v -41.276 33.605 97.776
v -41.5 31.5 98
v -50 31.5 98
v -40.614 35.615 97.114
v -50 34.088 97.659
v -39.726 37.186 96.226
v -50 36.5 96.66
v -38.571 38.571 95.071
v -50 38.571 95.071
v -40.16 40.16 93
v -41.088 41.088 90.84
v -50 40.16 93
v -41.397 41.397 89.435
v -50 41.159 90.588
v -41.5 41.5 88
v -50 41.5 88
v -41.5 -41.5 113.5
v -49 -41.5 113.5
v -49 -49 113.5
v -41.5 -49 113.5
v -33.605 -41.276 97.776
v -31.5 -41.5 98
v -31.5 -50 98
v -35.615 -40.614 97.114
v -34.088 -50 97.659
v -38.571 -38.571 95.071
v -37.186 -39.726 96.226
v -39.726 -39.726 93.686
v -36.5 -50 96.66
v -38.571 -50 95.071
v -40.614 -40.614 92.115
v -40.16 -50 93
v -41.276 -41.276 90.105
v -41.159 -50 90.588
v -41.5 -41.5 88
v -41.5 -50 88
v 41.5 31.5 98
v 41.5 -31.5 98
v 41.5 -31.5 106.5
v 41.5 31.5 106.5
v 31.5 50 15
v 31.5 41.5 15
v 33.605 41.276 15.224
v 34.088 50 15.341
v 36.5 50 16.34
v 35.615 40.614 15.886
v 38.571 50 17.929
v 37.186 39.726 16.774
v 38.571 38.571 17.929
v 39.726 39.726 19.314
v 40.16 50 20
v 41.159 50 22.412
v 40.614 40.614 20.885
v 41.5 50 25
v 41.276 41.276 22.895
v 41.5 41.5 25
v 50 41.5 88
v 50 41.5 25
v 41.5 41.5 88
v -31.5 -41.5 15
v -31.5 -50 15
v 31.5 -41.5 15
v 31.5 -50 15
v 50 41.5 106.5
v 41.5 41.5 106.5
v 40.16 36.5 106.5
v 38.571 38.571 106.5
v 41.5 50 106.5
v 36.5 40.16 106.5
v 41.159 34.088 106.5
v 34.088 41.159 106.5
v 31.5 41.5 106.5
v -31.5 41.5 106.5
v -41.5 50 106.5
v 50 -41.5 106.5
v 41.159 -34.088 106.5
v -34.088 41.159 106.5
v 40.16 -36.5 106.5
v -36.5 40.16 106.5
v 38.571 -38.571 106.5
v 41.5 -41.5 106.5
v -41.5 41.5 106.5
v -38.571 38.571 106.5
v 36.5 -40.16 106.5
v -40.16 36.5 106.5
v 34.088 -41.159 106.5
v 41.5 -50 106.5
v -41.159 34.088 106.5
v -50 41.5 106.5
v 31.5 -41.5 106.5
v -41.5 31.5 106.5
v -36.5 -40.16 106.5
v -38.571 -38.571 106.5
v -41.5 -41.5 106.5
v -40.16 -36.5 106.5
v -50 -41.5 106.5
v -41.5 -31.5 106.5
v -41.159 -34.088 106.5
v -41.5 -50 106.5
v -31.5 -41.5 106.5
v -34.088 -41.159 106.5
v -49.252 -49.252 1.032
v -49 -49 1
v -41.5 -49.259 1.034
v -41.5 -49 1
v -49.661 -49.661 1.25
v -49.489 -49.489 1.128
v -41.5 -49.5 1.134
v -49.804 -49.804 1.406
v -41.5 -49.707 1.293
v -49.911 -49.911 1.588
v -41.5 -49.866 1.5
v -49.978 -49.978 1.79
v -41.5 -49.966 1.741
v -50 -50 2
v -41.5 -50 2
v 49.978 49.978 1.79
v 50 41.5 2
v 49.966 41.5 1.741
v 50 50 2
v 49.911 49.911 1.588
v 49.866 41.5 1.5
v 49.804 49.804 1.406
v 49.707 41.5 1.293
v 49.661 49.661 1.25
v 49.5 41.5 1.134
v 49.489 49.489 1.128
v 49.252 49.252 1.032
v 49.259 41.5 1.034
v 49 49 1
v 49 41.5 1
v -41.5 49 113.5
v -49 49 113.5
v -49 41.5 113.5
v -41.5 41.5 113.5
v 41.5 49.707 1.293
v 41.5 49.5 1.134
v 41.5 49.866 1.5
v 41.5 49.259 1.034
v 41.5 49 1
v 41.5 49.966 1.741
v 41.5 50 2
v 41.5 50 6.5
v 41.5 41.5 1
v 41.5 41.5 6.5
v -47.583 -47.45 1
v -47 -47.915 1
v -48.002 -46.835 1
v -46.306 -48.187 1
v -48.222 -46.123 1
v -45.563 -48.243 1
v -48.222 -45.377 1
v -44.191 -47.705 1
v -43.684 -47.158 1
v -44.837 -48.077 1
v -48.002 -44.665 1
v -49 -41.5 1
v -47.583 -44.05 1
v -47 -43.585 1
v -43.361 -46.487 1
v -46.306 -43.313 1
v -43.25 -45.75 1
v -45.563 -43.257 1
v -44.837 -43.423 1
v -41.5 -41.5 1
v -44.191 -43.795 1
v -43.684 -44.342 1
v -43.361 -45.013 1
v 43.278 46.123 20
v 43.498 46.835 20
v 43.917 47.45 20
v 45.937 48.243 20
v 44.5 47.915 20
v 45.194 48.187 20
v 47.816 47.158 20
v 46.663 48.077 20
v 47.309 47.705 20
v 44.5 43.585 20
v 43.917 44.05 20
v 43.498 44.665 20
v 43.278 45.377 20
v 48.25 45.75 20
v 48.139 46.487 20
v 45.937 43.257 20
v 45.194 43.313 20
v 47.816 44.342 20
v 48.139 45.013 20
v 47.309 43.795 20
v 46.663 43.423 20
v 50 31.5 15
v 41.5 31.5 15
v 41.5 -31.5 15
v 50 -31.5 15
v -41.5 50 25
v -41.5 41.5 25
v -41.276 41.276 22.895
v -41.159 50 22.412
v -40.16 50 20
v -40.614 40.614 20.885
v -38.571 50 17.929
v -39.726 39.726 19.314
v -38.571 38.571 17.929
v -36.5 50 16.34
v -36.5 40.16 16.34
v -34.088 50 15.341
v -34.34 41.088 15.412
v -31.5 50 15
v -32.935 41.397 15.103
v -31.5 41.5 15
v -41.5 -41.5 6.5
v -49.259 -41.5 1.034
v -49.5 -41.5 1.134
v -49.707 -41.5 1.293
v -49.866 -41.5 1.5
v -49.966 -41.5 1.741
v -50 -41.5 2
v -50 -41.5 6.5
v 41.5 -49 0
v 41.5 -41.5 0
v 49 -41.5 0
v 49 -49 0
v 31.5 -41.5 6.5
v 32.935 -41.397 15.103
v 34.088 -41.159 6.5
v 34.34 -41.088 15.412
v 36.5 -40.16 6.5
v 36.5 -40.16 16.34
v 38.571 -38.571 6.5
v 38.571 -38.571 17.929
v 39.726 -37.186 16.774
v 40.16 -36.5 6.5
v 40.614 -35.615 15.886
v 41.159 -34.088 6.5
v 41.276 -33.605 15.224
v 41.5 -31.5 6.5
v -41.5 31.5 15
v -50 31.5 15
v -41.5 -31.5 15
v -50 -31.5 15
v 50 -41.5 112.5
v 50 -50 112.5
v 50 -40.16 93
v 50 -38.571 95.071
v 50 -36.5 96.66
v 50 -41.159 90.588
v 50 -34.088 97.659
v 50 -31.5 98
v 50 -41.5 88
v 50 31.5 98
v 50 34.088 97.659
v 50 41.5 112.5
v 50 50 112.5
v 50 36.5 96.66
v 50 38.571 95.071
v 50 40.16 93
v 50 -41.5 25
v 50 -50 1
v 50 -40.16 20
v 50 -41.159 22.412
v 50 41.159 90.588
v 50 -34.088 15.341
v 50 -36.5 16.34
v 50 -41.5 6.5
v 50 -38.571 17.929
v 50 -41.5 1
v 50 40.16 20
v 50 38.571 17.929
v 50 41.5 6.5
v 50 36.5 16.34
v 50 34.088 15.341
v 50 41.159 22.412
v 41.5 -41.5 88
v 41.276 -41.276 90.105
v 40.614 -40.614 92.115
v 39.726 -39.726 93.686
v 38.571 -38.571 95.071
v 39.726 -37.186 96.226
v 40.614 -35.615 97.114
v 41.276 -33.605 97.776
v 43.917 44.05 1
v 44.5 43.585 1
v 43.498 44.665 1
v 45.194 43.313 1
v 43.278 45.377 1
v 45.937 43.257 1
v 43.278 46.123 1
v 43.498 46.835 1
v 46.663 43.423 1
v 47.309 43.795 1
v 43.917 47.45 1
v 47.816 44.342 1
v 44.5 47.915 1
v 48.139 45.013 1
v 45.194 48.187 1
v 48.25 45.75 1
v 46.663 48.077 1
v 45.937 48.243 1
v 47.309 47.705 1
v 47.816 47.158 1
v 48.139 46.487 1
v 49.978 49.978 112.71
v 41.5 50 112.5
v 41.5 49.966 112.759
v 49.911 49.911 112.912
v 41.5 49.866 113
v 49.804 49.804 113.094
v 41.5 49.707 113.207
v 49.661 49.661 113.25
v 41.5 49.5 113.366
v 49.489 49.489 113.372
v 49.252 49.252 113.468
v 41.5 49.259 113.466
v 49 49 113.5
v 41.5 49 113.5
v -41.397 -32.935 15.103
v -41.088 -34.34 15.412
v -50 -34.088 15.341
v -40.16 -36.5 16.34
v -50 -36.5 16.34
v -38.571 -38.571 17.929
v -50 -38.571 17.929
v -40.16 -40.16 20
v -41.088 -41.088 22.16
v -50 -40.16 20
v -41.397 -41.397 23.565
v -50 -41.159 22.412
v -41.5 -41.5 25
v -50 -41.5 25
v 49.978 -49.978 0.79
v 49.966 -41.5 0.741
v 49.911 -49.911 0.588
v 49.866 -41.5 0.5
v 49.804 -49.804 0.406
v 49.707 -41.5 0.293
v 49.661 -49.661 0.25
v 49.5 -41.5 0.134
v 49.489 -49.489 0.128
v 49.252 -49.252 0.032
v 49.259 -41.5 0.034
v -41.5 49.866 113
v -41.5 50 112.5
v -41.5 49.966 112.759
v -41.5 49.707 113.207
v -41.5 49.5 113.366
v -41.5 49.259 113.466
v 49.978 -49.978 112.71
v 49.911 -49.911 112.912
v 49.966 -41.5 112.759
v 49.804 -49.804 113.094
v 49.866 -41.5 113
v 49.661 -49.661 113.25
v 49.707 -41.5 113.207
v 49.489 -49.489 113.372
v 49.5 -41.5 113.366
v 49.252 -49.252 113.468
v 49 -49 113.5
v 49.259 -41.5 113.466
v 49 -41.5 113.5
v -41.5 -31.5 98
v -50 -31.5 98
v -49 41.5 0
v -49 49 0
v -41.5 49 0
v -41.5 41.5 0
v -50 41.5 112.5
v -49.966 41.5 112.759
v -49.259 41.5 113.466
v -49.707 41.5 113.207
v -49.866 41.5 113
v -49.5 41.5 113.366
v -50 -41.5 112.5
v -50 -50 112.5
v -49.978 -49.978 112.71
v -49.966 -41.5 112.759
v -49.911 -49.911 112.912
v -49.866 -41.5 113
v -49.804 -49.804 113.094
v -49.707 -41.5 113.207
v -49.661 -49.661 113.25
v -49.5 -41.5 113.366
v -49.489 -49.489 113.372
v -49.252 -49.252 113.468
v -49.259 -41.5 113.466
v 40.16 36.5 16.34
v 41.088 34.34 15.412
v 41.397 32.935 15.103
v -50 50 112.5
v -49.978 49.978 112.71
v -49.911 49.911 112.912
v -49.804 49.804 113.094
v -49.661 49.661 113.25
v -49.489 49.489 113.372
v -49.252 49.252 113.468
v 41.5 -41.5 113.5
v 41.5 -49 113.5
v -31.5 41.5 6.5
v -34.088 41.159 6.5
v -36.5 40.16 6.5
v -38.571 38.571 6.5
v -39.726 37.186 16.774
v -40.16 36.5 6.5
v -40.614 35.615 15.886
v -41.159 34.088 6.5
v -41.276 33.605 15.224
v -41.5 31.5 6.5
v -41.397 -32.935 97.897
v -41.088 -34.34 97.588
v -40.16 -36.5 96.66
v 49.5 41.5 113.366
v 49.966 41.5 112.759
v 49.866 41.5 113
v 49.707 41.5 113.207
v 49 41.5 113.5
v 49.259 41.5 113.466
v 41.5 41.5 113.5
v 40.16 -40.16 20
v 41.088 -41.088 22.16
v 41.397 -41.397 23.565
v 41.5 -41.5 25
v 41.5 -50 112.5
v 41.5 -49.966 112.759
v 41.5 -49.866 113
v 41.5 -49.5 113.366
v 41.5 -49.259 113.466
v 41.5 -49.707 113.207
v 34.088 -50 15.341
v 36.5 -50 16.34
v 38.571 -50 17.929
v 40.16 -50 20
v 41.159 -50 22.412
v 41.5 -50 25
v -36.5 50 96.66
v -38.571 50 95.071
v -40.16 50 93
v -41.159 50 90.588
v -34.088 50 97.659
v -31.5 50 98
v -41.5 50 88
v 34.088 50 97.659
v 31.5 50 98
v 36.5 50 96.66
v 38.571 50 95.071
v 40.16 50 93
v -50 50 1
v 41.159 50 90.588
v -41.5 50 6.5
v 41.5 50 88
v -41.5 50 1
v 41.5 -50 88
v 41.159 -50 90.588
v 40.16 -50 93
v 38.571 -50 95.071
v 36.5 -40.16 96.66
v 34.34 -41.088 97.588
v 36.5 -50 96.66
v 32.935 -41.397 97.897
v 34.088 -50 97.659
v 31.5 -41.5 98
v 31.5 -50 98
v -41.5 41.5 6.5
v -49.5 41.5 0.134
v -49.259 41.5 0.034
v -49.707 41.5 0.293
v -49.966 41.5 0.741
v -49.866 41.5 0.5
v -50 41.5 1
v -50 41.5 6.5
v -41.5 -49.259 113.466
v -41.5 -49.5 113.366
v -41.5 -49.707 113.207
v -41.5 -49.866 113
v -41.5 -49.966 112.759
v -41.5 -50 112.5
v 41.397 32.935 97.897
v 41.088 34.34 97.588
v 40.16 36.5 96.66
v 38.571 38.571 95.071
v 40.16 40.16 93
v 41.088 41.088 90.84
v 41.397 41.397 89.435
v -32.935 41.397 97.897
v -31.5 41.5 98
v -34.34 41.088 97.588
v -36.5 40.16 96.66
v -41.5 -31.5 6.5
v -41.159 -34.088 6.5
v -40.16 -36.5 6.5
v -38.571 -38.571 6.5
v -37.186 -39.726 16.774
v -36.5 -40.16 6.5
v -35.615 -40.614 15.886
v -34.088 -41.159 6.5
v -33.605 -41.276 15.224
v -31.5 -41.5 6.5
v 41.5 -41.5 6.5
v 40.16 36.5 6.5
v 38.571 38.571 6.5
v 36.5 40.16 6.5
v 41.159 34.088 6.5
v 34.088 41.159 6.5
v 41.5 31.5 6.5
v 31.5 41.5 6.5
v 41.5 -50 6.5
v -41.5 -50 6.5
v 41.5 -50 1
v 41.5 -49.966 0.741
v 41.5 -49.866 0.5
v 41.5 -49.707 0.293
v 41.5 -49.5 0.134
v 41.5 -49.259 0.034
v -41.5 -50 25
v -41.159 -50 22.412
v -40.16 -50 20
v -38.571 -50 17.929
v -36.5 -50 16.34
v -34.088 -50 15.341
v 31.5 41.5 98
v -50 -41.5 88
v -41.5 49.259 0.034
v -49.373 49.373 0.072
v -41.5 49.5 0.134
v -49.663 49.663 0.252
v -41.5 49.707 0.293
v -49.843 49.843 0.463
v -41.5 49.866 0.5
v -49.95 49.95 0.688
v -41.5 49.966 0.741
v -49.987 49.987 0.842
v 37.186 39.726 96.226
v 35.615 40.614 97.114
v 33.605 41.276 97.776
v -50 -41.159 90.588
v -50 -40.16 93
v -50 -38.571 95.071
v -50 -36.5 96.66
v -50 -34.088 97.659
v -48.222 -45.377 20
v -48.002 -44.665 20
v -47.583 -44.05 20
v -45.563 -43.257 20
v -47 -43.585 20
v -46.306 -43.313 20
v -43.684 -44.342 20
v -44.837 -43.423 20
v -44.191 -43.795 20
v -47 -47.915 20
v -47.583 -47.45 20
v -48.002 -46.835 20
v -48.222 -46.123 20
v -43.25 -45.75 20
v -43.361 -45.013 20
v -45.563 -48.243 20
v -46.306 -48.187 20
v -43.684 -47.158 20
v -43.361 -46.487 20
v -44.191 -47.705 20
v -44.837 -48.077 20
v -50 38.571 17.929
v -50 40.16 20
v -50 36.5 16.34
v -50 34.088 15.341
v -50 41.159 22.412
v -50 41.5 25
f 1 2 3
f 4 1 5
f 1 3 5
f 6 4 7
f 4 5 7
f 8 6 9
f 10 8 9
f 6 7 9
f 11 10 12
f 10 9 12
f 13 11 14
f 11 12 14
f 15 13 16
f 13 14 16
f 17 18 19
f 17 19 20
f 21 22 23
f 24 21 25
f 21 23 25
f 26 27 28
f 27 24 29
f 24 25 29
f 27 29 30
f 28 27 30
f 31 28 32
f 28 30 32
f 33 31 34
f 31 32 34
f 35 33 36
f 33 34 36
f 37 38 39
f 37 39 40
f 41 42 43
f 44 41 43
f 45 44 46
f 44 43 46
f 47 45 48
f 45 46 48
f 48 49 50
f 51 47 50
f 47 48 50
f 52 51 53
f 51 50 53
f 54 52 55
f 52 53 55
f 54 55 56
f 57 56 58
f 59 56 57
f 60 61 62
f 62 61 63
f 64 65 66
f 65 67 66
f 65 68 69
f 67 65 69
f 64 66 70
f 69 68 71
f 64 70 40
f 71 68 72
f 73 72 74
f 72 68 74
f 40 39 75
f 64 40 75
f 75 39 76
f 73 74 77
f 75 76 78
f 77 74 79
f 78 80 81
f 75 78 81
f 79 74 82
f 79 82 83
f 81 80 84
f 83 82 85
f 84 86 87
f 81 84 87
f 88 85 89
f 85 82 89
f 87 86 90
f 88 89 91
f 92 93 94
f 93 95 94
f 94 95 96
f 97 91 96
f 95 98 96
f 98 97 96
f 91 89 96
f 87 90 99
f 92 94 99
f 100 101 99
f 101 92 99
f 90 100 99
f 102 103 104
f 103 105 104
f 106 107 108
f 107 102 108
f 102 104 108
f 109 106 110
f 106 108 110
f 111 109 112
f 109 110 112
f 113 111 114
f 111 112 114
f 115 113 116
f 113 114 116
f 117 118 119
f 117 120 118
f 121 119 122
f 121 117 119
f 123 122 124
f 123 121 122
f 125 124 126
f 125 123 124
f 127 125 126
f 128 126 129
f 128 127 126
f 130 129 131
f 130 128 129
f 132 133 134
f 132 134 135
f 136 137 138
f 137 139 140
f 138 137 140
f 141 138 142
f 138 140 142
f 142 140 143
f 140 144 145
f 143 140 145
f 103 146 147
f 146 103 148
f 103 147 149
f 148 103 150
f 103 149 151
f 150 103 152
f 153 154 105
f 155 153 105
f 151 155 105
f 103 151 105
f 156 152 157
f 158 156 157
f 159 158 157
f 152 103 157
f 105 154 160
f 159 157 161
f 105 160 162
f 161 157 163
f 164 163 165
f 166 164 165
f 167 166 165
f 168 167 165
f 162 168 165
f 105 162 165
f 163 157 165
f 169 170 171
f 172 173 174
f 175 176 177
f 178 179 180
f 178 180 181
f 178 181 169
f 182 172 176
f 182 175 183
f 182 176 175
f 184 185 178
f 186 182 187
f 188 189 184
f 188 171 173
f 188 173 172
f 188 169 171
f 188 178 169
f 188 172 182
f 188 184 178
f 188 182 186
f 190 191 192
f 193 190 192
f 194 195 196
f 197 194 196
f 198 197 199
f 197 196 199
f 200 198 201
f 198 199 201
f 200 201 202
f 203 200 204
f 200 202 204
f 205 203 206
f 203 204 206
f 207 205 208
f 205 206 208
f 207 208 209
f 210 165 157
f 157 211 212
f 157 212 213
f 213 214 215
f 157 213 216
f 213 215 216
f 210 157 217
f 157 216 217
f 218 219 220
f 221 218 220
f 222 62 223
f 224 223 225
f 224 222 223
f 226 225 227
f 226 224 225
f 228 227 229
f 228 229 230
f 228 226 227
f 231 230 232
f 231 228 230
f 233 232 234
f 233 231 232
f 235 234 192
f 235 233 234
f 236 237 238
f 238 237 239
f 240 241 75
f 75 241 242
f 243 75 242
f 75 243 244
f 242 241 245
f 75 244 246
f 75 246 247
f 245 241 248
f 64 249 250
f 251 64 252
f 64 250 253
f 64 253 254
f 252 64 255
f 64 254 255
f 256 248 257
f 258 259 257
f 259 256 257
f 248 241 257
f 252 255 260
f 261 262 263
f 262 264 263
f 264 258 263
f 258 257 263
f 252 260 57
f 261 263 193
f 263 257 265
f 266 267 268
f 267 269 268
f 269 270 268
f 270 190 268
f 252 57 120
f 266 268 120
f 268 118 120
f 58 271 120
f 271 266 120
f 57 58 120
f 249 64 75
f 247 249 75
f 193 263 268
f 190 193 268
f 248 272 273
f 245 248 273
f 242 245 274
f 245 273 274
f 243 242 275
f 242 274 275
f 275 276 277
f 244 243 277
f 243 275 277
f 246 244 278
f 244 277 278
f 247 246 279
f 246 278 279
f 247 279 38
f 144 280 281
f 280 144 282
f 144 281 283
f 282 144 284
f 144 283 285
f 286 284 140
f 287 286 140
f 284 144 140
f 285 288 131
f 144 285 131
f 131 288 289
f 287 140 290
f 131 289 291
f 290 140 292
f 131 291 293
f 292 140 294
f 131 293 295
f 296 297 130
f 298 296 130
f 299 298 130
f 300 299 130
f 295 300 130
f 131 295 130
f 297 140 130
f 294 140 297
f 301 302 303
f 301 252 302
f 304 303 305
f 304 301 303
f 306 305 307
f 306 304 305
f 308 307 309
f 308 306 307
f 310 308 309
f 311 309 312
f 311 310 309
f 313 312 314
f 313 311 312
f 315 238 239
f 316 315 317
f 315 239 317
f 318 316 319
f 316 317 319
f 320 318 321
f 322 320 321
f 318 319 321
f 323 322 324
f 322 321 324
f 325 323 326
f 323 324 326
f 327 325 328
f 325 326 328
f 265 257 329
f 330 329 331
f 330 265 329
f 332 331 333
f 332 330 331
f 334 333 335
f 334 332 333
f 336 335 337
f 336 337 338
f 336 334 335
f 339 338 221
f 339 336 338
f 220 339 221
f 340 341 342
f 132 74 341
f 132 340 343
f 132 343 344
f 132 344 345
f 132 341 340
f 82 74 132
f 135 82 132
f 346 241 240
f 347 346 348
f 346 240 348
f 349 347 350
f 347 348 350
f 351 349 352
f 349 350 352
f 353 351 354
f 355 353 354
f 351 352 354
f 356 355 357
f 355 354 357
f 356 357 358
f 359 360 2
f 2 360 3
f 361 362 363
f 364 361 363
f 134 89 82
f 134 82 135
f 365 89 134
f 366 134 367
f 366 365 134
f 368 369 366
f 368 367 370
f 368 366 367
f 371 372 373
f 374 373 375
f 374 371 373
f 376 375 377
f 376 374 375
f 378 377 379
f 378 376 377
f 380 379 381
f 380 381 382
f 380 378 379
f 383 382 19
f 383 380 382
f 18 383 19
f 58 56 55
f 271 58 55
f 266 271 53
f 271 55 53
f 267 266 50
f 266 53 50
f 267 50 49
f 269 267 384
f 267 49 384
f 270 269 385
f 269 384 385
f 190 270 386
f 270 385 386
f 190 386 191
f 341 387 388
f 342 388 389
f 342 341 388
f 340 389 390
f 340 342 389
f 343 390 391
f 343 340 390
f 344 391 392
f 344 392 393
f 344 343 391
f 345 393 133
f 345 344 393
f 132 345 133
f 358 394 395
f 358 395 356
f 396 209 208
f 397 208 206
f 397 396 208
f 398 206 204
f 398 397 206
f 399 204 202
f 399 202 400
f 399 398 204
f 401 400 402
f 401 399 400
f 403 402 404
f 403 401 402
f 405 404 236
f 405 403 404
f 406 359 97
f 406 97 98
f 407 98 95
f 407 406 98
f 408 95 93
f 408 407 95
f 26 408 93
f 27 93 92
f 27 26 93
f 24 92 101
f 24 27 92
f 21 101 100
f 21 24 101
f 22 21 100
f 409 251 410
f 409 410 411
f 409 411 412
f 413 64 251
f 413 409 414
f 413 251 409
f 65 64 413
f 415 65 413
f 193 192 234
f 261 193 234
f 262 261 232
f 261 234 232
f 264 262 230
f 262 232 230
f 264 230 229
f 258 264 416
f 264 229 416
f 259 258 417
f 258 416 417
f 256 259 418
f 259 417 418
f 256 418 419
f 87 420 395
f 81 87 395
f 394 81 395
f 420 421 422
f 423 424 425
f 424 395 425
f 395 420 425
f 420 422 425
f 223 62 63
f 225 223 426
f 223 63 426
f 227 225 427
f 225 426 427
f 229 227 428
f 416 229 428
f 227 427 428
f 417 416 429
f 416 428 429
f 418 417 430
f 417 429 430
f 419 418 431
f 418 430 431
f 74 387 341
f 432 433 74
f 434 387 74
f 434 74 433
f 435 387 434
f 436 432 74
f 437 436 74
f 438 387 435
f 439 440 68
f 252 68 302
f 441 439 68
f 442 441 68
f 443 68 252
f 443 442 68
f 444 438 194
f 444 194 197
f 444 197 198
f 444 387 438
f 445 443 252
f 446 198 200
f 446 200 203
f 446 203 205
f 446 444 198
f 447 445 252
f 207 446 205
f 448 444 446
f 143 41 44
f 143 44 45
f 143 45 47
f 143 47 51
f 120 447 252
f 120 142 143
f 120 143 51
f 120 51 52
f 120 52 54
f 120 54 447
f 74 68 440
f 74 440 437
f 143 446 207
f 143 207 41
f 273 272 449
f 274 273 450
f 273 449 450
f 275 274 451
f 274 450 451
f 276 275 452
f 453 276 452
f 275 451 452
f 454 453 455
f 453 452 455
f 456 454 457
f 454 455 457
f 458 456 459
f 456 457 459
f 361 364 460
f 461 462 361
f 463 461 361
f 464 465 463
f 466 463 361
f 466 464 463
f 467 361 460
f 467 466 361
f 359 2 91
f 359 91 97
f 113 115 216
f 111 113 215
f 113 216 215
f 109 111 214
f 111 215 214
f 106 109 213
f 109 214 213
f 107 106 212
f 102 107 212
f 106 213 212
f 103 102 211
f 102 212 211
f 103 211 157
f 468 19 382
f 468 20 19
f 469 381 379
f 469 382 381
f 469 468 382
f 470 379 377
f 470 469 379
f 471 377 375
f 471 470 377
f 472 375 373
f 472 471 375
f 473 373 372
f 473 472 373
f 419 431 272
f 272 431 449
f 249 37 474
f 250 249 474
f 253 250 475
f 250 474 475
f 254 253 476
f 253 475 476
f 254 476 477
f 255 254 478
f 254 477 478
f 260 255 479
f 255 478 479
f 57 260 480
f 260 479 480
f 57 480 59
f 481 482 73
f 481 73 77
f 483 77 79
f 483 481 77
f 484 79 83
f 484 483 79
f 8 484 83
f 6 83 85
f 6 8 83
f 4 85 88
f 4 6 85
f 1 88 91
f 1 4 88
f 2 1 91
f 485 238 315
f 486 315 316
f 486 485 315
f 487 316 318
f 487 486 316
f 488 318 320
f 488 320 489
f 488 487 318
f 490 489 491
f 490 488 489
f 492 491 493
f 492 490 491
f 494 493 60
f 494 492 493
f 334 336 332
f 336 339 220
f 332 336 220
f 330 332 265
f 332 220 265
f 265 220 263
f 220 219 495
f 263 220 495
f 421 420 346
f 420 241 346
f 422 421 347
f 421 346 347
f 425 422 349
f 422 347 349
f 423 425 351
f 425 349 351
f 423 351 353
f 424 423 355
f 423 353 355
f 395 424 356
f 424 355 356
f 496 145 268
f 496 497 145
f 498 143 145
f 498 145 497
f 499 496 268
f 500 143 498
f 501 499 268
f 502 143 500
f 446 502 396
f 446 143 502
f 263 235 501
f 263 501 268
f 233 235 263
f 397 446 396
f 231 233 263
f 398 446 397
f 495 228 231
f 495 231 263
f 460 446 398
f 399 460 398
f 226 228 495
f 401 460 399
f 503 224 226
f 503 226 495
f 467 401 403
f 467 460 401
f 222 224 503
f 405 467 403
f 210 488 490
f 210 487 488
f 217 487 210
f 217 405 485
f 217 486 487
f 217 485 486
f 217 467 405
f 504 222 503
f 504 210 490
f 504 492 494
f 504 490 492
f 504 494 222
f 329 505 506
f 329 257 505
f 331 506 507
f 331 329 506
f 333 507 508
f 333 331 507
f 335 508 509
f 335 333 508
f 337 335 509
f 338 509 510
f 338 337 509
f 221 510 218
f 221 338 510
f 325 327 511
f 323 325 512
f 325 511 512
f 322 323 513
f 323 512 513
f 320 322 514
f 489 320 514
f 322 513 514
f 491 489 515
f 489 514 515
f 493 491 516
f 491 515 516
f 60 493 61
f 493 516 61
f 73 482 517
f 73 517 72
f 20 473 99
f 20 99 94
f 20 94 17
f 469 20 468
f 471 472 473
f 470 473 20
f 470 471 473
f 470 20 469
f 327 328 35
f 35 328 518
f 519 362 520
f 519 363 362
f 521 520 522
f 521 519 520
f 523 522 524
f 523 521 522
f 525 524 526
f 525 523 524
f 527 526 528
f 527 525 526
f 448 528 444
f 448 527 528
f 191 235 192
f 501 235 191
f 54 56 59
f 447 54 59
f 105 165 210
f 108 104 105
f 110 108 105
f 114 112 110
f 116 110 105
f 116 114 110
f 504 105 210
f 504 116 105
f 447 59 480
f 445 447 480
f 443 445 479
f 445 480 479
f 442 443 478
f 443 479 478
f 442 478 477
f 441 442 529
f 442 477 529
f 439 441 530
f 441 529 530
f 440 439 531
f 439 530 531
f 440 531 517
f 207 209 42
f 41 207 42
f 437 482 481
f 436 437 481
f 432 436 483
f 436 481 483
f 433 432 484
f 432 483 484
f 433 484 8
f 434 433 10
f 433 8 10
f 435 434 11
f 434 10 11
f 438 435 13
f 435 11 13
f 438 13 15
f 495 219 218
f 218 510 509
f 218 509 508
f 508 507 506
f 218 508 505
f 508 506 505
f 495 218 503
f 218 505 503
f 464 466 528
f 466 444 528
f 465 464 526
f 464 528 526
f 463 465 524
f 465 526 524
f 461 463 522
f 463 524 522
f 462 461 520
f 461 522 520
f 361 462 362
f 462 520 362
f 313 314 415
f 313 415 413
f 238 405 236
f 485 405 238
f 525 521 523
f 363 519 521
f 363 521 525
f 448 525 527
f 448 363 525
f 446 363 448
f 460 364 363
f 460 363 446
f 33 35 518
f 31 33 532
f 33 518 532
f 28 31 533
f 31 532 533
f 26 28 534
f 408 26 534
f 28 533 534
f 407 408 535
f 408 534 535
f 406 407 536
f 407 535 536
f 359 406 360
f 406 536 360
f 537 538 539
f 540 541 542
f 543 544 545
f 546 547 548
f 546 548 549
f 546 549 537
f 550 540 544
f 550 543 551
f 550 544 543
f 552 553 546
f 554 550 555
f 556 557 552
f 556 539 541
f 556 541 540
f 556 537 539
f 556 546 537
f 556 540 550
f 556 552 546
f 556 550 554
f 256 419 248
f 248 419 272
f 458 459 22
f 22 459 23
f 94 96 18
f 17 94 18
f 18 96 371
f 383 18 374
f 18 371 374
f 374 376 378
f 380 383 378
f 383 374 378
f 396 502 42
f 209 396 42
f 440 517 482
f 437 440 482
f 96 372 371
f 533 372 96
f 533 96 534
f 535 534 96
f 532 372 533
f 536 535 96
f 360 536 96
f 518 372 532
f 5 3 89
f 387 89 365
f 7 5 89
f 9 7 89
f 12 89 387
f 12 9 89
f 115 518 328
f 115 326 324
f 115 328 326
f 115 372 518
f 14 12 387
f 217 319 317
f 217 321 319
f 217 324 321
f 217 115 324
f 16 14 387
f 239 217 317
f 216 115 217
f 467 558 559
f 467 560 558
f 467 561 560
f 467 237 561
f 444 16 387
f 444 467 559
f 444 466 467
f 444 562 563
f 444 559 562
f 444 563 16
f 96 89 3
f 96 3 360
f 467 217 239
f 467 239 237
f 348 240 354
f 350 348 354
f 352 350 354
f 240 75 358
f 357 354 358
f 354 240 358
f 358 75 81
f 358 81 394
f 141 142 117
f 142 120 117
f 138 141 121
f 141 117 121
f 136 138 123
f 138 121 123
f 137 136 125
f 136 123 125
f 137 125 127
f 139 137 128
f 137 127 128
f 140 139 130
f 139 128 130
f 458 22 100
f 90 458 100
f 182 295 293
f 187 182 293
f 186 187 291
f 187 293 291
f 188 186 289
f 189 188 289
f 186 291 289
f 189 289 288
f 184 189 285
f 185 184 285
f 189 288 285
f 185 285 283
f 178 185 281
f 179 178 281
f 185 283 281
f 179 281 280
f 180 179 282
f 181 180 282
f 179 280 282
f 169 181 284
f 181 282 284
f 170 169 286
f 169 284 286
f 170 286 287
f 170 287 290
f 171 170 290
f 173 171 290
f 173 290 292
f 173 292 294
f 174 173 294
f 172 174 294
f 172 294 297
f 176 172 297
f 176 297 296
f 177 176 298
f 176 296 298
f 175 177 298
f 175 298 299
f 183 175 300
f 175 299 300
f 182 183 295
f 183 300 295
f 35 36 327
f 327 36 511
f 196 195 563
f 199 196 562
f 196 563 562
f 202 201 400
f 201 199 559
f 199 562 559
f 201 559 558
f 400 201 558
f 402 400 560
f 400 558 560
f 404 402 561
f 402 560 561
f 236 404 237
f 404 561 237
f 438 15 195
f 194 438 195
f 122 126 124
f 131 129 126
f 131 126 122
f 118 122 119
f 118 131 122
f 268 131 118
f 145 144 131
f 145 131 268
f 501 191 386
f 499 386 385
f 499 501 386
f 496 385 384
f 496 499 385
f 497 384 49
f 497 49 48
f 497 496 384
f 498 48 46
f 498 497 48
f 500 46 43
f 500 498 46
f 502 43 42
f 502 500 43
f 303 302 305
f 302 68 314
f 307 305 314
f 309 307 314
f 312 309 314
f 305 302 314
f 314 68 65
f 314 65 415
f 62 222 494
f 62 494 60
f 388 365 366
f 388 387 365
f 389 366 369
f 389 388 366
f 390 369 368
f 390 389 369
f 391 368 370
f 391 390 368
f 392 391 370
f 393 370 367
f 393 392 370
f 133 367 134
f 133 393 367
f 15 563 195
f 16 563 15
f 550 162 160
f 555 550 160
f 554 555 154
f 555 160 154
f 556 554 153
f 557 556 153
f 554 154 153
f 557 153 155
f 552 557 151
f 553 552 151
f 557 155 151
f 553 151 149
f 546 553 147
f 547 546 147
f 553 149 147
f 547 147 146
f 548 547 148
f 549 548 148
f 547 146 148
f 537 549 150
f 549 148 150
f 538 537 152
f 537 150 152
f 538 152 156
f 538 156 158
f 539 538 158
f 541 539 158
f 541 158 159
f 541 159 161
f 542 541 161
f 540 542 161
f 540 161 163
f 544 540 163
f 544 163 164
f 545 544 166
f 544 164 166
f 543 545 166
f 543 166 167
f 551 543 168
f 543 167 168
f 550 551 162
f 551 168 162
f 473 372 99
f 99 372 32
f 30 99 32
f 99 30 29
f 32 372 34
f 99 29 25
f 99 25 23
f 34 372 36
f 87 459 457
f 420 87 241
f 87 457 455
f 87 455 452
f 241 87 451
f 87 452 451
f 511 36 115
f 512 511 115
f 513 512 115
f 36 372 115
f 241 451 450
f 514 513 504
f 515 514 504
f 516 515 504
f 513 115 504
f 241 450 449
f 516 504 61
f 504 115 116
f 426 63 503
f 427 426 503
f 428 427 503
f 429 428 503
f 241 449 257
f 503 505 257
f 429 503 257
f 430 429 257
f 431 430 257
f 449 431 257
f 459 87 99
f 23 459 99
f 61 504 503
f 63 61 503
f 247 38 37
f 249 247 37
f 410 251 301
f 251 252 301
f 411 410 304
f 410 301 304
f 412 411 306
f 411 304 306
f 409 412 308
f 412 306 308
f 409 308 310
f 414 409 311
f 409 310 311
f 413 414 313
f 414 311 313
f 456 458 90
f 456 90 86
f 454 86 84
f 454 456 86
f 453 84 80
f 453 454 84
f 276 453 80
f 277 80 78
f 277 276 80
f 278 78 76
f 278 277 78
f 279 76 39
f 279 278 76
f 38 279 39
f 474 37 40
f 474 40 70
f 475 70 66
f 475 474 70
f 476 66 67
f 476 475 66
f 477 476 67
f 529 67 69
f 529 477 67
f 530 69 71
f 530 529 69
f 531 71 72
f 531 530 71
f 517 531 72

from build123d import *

# Parameters (mm, degrees)
F0_W      = 100
F0_H      = 100
F1_DEPTH  = 113.5
F3_DEPTH  = 25
F4_DEPTH  = 120
F5_W      = 83
F5_H      = 6.5
F5_H_2    = 7
F6_DEPTH  = 105
F7_W      = 83
F7_H      = 7
F7_H_2    = 6.5
F8_DEPTH  = 105
F9_DEPTH  = 1
F10_R     = 1
F11_R     = 2.5
F12_DEPTH = 19


with BuildPart() as f1:
    # F0 (on Top) → F1 (new body)
    with BuildSketch(Plane.XY):
        Rectangle(F0_W, F0_H)
    extrude(amount=F1_DEPTH)

    # F2 (on Top) → F3 (join)
    with BuildSketch(Plane.XY):
        with BuildLine():
            Line((31.5, 41.5), (-31.5, 41.5))
            ThreePointArc((-31.5, 41.5), (-38.5710678119, 38.5710678119), (-41.5, 31.5))
            Line((-41.5, 31.5), (-41.5, -31.5))
            ThreePointArc((-41.5, -31.5), (-38.5710678119, -38.5710678119), (-31.5, -41.5))
            Line((-31.5, -41.5), (31.5, -41.5))
            ThreePointArc((31.5, -41.5), (38.5710678119, -38.5710678119), (41.5, -31.5))
            Line((41.5, -31.5), (41.5, 31.5))
            ThreePointArc((41.5, 31.5), (38.5710678119, 38.5710678119), (31.5, 41.5))
        make_face()
    extrude(amount=F3_DEPTH)

    # F2 (on Top) → F4 (cut)
    with BuildSketch(Plane.XY):
        with BuildLine():
            Line((31.5, 41.5), (-31.5, 41.5))
            ThreePointArc((-31.5, 41.5), (-38.5710678119, 38.5710678119), (-41.5, 31.5))
            Line((-41.5, 31.5), (-41.5, -31.5))
            ThreePointArc((-41.5, -31.5), (-38.5710678119, -38.5710678119), (-31.5, -41.5))
            Line((-31.5, -41.5), (31.5, -41.5))
            ThreePointArc((31.5, -41.5), (38.5710678119, -38.5710678119), (41.5, -31.5))
            Line((41.5, -31.5), (41.5, 31.5))
            ThreePointArc((41.5, 31.5), (38.5710678119, 38.5710678119), (31.5, 41.5))
        make_face()
    extrude(amount=F4_DEPTH, mode=Mode.SUBTRACT)

    # F5 (on face) → F6 (cut)
    with BuildSketch(Plane(origin=(-50, 0, 0), x_dir=(0, -1, 0), z_dir=(-1, 0, 0))):
        with BuildLine():
            ThreePointArc((-41.5, 25), (-38.5710678119, 17.9289321881), (-31.5, 15))
            Line((-31.5, 15), (31.5, 15))
            ThreePointArc((31.5, 15), (38.5710678119, 17.9289321881), (41.5, 25))
            Line((41.5, 25), (41.5, 88))
            ThreePointArc((41.5, 88), (38.5710678119, 95.0710678119), (31.5, 98))
            Line((31.5, 98), (-31.5, 98))
            ThreePointArc((-31.5, 98), (-38.5710678119, 95.0710678119), (-41.5, 88))
            Line((-41.5, 88), (-41.5, 25))
        make_face()
        with Locations((0, 3.25)):
            Rectangle(F5_W, F5_H)
        with Locations((0, 110)):
            Rectangle(F5_W, F5_H_2)
    extrude(amount=-F6_DEPTH, mode=Mode.SUBTRACT)

    # F7 (on face) → F8 (cut)
    with BuildSketch(Plane.XZ.offset(50)):
        with Locations((0, 110)):
            Rectangle(F7_W, F7_H)
        with BuildLine():
            ThreePointArc((-31.5, 98), (-38.5710678119, 95.0710678119), (-41.5, 88))
            Line((-41.5, 88), (-41.5, 25))
            ThreePointArc((-41.5, 25), (-38.5710678119, 17.9289321881), (-31.5, 15))
            Line((-31.5, 15), (31.5, 15))
            ThreePointArc((31.5, 15), (38.5710678119, 17.9289321881), (41.5, 25))
            Line((41.5, 25), (41.5, 88))
            ThreePointArc((41.5, 88), (38.5710678119, 95.0710678119), (31.5, 98))
            Line((31.5, 98), (-31.5, 98))
        make_face()
        with Locations((0, 3.25)):
            Rectangle(F7_W, F7_H_2)
    extrude(amount=-F8_DEPTH, mode=Mode.SUBTRACT)

    # F9 (cut): faces of the model
    f9_faces = [f1.faces().sort_by_distance(p)[0] for p in [
        (-45.75, -45.75, 0),
        (-45.75, -45.75, 113.5),
        (45.75, 45.75, 113.5),
        (45.75, 45.75, 0),
    ]]
    extrude(f9_faces, amount=-F9_DEPTH, dir=(0, 0, -1), mode=Mode.SUBTRACT)

    # F10
    f10_edges = [f1.edges().sort_by_distance(p)[0] for p in [
        (45.75, -50, 0),
        (50, -45.75, 0),
        (50, -45.75, 113.5),
        (45.75, -50, 113.5),
        (50, 45.75, 113.5),
        (45.75, 50, 113.5),
        (50, 45.75, 1),
        (45.75, 50, 1),
        (-45.75, 50, 0),
        (-50, 45.75, 0),
        (-50, -45.75, 1),
        (-45.75, -50, 1),
        (-50, -45.75, 113.5),
        (-45.75, -50, 113.5),
        (-50, 45.75, 113.5),
        (-45.75, 50, 113.5),
    ]]
    fillet(f10_edges, radius=F10_R)

    # F11 (on face) → F12 (cut)
    with BuildSketch(Plane(origin=(0, 0, 1), x_dir=(1, 0, 0), z_dir=(0, 0, -1))):
        with Locations((-45.75, 45.75)):
            Circle(F11_R)
        with Locations((45.75, -45.75)):
            Circle(F11_R)
    extrude(amount=-F12_DEPTH, mode=Mode.SUBTRACT)


solid = f1.part
